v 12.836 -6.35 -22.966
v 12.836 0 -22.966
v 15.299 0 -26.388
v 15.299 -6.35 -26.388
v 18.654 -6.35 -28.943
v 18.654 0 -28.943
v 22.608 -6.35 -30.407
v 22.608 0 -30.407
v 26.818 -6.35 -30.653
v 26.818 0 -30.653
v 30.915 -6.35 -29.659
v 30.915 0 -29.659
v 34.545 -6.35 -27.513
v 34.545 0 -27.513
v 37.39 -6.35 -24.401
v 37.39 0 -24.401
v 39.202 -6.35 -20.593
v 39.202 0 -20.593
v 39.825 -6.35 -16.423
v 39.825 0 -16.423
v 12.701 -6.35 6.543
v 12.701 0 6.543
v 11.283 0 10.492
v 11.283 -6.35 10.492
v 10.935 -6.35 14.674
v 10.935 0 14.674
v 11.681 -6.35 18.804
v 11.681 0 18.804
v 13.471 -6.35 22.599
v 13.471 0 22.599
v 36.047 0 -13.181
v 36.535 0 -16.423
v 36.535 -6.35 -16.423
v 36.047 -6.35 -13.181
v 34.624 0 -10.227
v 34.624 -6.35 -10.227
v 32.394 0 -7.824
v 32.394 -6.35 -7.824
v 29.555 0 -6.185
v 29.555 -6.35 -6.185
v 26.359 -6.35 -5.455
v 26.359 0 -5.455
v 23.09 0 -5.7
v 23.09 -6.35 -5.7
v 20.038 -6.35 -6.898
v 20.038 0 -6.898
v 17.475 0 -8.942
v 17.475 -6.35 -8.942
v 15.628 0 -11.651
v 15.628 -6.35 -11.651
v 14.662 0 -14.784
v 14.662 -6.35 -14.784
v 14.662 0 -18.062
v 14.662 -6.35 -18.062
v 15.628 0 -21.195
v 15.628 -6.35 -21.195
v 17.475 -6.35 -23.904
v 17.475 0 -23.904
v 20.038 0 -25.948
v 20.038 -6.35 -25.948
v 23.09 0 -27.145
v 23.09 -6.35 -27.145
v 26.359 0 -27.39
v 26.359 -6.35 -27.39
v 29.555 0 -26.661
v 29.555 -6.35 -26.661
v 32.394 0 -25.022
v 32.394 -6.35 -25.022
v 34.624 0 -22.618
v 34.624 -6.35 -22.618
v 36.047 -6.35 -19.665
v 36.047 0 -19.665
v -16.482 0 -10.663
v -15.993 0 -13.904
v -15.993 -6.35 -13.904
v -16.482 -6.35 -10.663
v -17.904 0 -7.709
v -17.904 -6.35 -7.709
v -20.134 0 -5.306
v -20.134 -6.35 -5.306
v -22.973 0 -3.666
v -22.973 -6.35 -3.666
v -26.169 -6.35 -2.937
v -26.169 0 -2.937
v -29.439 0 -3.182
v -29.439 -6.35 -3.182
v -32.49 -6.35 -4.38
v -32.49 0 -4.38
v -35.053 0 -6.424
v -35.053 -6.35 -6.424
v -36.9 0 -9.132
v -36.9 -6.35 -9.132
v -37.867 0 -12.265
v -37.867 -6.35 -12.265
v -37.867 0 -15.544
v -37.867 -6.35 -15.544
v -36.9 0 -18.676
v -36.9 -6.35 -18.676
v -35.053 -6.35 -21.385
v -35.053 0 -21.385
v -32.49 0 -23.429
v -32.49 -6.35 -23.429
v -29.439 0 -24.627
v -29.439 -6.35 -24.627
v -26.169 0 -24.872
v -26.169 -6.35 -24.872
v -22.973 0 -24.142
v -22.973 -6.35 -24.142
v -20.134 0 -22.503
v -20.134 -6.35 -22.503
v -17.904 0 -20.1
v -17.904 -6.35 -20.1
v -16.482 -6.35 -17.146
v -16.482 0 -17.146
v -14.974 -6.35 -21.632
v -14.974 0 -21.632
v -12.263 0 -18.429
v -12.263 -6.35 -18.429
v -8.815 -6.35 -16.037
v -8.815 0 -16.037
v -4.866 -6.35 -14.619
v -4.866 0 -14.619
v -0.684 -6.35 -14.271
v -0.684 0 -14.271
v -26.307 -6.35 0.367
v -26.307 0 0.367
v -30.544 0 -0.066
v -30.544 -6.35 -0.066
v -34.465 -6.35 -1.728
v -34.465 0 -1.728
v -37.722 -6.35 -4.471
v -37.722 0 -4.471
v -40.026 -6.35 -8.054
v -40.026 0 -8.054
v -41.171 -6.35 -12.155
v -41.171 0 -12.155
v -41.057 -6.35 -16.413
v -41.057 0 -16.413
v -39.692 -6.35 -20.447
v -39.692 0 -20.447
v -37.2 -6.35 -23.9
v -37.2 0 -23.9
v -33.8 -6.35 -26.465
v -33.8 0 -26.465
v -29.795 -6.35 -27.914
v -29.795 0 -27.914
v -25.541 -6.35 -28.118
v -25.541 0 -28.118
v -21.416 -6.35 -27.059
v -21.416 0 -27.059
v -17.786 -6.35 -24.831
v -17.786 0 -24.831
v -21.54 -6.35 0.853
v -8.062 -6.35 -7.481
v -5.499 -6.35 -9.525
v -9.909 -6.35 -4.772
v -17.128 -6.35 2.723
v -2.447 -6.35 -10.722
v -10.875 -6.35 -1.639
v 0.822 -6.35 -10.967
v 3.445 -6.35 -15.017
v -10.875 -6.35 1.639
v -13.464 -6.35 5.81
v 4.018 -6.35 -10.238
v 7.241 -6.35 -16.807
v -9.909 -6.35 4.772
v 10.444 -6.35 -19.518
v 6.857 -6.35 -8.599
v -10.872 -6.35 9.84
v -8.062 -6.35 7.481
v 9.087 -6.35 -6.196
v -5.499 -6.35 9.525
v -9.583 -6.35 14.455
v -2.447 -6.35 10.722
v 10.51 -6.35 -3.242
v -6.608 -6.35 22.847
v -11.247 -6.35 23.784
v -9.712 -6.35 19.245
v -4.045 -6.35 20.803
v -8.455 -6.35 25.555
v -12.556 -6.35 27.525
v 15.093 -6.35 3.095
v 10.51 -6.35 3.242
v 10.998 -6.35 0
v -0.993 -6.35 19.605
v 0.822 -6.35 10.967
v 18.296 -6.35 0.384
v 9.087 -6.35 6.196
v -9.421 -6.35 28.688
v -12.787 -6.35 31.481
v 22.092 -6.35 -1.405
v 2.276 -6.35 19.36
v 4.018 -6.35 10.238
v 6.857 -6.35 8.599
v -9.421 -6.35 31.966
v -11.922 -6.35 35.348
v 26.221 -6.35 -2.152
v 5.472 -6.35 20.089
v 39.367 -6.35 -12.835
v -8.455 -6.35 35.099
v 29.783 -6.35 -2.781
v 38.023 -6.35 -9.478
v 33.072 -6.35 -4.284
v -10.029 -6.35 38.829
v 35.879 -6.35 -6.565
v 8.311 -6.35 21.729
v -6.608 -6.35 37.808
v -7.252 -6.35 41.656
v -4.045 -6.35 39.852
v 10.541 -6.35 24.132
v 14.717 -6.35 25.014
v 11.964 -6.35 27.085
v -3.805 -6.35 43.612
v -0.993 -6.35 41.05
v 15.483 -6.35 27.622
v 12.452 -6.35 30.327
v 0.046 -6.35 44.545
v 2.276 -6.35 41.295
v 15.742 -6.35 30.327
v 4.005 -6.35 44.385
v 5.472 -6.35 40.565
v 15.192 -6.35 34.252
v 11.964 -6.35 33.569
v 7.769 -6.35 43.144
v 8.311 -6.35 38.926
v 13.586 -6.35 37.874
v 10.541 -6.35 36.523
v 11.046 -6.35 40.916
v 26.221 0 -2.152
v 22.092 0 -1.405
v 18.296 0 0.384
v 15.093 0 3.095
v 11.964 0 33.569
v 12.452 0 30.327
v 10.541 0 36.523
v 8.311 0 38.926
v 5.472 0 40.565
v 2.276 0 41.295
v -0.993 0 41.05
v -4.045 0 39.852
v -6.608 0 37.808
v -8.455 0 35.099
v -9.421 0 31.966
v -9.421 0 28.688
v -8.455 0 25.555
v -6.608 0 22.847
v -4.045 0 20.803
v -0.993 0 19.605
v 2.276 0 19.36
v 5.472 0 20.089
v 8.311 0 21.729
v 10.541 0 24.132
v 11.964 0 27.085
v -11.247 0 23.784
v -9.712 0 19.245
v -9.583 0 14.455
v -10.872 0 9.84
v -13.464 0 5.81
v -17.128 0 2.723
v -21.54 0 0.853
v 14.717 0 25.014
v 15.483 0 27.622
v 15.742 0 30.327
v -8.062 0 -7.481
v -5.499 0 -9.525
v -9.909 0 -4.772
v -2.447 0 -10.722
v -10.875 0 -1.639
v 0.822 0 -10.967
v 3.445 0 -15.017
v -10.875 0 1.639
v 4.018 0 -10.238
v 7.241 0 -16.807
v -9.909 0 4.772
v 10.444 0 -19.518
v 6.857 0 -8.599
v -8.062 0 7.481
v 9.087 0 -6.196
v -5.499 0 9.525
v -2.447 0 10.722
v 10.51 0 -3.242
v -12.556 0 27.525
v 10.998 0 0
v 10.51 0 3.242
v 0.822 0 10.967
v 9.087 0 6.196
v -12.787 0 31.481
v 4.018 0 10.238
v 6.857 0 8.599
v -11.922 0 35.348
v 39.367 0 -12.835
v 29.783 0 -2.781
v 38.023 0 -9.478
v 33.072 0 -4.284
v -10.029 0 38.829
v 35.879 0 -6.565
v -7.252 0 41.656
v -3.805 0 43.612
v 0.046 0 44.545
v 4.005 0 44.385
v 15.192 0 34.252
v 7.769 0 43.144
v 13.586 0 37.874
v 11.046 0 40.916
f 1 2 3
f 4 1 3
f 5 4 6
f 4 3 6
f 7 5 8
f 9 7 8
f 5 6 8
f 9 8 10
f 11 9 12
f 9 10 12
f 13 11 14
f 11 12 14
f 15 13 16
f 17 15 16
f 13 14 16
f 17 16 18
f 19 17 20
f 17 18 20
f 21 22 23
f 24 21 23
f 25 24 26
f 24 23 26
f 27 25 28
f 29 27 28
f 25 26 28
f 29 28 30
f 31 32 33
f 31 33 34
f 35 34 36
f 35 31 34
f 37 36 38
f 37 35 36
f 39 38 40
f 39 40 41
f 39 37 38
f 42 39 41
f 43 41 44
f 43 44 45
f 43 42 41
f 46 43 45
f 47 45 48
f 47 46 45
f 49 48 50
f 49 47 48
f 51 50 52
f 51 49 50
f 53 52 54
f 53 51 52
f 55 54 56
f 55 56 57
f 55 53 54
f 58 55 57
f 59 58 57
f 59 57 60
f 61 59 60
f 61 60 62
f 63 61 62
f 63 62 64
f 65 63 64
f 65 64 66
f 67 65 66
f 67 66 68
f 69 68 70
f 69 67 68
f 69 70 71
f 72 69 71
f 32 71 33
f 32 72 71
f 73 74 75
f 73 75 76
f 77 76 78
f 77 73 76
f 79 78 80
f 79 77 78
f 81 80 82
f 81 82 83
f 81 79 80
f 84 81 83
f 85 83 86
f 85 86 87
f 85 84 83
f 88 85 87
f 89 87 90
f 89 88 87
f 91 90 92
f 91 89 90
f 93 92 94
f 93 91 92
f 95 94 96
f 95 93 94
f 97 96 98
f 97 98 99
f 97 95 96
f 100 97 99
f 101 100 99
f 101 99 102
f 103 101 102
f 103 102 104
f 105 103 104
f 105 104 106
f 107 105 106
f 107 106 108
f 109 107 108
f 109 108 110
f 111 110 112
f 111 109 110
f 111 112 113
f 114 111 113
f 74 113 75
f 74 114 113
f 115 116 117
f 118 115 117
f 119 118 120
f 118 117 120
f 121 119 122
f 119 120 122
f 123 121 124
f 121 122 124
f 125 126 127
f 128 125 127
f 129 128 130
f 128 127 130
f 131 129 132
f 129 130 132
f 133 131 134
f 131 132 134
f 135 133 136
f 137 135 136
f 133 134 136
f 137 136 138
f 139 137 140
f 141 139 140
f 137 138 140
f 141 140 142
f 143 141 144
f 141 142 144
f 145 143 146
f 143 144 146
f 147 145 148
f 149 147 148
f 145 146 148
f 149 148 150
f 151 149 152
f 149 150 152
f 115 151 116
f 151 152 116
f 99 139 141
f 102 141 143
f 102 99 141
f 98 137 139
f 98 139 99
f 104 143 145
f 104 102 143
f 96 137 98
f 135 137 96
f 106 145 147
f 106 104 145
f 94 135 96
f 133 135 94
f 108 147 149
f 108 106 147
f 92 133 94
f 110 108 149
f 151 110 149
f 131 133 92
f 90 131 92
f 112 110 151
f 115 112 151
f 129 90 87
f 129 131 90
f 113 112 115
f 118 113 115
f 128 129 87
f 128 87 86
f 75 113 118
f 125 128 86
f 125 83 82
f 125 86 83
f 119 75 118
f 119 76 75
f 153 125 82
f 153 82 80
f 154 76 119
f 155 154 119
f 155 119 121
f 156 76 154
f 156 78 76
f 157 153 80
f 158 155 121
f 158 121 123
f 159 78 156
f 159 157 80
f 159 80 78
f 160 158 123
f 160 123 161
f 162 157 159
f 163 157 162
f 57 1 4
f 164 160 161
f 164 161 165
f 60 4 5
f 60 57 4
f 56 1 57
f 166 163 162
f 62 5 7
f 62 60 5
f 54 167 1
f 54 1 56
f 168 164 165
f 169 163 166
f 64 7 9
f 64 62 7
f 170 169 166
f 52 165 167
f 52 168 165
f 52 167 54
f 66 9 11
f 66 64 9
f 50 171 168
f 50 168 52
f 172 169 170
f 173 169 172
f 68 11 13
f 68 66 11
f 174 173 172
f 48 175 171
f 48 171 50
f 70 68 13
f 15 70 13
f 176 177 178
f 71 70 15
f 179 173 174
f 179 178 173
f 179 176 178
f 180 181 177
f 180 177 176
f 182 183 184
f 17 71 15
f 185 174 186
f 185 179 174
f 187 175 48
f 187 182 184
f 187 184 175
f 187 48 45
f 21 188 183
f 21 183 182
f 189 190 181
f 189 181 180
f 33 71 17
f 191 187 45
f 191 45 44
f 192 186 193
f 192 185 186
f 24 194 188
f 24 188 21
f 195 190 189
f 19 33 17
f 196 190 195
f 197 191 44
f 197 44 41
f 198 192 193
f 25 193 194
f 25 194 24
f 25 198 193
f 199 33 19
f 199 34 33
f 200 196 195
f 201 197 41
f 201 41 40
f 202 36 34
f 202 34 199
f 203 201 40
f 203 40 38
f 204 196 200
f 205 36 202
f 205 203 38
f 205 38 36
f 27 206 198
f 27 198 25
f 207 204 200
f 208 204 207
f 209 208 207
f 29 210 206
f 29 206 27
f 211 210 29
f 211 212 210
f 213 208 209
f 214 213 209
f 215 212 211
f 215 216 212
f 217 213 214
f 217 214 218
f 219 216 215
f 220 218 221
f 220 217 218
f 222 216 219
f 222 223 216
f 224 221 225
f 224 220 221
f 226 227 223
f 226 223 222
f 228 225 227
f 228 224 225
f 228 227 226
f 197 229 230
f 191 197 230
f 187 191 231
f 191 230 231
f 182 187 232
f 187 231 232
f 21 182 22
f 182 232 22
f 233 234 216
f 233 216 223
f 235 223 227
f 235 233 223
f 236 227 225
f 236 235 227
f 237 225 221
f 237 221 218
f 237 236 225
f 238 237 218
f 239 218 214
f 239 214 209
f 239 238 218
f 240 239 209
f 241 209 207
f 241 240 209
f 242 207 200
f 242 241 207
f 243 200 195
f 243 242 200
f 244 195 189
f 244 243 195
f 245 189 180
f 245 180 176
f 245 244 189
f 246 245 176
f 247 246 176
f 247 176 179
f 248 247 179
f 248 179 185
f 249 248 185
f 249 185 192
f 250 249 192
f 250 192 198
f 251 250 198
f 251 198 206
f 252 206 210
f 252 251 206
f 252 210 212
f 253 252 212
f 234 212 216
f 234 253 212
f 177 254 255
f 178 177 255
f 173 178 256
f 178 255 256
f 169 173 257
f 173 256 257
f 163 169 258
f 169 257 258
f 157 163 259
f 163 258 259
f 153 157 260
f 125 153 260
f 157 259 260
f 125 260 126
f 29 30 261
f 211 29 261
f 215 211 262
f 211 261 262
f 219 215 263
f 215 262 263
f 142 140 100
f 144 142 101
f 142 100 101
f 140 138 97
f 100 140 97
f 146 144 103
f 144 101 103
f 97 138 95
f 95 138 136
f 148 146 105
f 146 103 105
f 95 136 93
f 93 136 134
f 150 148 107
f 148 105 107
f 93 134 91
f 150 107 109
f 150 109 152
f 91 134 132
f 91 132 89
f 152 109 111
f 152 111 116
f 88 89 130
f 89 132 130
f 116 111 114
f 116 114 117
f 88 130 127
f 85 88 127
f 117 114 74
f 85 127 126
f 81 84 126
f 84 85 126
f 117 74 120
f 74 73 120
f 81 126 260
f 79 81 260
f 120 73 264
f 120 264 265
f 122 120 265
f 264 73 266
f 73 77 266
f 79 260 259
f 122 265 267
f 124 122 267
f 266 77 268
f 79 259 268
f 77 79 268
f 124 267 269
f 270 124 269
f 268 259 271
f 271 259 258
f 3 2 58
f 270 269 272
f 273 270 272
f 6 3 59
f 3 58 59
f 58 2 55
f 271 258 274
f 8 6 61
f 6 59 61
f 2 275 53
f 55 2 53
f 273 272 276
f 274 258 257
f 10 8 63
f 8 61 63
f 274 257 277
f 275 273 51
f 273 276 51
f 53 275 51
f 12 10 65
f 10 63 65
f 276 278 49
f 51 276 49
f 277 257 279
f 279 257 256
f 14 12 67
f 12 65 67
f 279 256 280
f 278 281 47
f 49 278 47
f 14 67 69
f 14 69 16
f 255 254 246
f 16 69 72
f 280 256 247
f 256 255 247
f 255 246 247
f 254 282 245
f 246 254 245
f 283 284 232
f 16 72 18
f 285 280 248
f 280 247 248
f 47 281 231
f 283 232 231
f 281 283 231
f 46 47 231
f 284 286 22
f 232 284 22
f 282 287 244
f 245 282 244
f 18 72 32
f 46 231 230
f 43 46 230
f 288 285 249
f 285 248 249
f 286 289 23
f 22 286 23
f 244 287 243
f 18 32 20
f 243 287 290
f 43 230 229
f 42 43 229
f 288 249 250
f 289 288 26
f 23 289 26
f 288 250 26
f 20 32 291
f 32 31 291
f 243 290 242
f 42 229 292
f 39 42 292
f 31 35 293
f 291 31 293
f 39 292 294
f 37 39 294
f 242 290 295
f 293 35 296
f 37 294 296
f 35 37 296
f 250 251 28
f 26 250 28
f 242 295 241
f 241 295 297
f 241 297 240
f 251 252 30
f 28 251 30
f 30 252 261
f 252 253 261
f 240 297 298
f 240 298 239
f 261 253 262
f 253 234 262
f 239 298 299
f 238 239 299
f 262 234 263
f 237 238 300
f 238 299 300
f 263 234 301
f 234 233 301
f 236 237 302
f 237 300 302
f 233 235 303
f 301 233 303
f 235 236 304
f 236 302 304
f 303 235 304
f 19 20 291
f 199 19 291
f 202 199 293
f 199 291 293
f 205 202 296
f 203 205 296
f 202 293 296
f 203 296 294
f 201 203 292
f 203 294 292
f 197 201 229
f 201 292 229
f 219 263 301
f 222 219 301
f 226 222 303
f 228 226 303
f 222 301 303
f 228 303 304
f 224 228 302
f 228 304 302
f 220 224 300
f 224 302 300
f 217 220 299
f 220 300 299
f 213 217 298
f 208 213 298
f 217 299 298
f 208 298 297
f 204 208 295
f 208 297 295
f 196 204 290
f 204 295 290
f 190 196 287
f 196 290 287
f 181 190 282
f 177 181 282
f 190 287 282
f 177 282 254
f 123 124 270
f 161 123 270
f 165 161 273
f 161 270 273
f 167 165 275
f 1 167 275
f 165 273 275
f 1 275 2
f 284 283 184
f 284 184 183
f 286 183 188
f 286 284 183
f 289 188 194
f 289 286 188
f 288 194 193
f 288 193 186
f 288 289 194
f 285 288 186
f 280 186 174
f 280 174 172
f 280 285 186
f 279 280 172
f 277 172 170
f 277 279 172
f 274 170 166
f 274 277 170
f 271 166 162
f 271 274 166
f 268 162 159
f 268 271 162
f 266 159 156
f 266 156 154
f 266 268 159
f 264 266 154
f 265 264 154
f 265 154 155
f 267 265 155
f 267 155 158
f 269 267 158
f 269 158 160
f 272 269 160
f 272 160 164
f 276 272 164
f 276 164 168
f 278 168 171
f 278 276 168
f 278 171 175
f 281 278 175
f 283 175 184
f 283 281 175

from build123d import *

# Parameters (mm, degrees)
F0_R     = 10.9982
F1_DEPTH = 6.35


with BuildPart() as f1:
    # F0 (on Front) → F1 (new body)
    with BuildSketch(Plane.XZ):
        with BuildLine():
            ThreePointArc((12.7012721412, 6.542961275), (13.8852814514, 3.3662464655), (14.2875, 0))
            ThreePointArc((14.2875, 0), (9.8578957303, -10.3418831951), (-0.6842652522, -14.2711049788))
            ThreePointArc((-0.6842652522, -14.2711049788), (7.240663618, -16.8071465228), (12.8358325851, -22.965887347))
            ThreePointArc((12.8358325851, -22.965887347), (13.5200979128, -8.6947823719), (26.2213700252, -2.151821041))
            ThreePointArc((26.2213700252, -2.151821041), (18.2964411378, 0.3842204693), (12.7012721412, 6.542961275))
        make_face()
        with BuildLine():
            ThreePointArc((-14.9742166985, -21.6324620433), (-8.8154758203, -16.0372930271), (-0.6842652522, -14.2711049788))
            ThreePointArc((-0.6842652522, -14.2711049788), (-12.7012721174, -6.5429613211), (-12.0170067319, 7.7281437263))
            ThreePointArc((-12.0170067319, 7.7281437263), (-18.1757475859, 2.1329746676), (-26.3069581555, 0.366786576))
            ThreePointArc((-26.3069581555, 0.366786576), (-16.649340262, -4.0464226961), (-12.7037234832, -13.9043183991))
            ThreePointArc((-12.7037234832, -13.9043183991), (-13.283093766, -17.9317041401), (-14.9742166985, -21.6324620433))
        make_face()
        with BuildLine():
            ThreePointArc((-12.0170067319, 7.7281437263), (0.6842654078, 14.2711049713), (12.7012721412, 6.542961275))
            ThreePointArc((12.7012721412, 6.542961275), (10.9350840416, 14.6741718257), (13.4711255704, 22.5991007709))
            ThreePointArc((13.4711255704, 22.5991007709), (0.769853458, 16.0561394401), (-11.2471533267, 23.7842830843))
            ThreePointArc((-11.2471533267, 23.7842830843), (-9.4809652551, 15.6530726068), (-12.0170067319, 7.7281437263))
        make_face()
        with BuildLine():
            ThreePointArc((39.8246046975, -16.4229260161), (35.8789879186, -6.5650303131), (26.2213700252, -2.151821041))
            ThreePointArc((26.2213700252, -2.151821041), (13.5200979128, -8.6947823719), (12.8358325851, -22.965887347))
            ThreePointArc((12.8358325851, -22.965887347), (28.9033511936, -30.3082074601), (39.8246046975, -16.4229260161))
        make_face()
        with Locations((25.5371046975, -16.4229260161)):
            Circle(F0_R, mode=Mode.SUBTRACT)
        with BuildLine():
            ThreePointArc((-11.2471533267, 23.7842830843), (0.769853458, 16.0561394401), (13.4711255704, 22.5991007709))
            ThreePointArc((13.4711255704, 22.5991007709), (15.1622485029, 26.2998586742), (15.7416187857, 30.3272444152))
            ThreePointArc((15.7416187857, 30.3272444152), (-1.9121277104, 44.2125258591), (-11.2471533267, 23.7842830843))
        make_face()
        with Locations((1.4541187857, 30.3272444152)):
            Circle(F0_R, mode=Mode.SUBTRACT)
        with BuildLine():
            ThreePointArc((-0.6842652522, -14.2711049788), (9.8578957303, -10.3418831951), (14.2875, 0))
            ThreePointArc((14.2875, 0), (13.8852814514, 3.3662464655), (12.7012721412, 6.542961275))
            ThreePointArc((12.7012721412, 6.542961275), (0.6842654078, 14.2711049713), (-12.0170067319, 7.7281437263))
            ThreePointArc((-12.0170067319, 7.7281437263), (-12.7012721174, -6.5429613211), (-0.6842652522, -14.2711049788))
        make_face()
        Circle(F0_R, mode=Mode.SUBTRACT)
        with BuildLine():
            ThreePointArc((-26.3069581555, 0.366786576), (-39.6924955955, -20.44727973), (-14.9742166985, -21.6324620433))
            ThreePointArc((-14.9742166985, -21.6324620433), (-13.283093766, -17.9317041401), (-12.7037234832, -13.9043183991))
            ThreePointArc((-12.7037234832, -13.9043183991), (-16.649340262, -4.0464226961), (-26.3069581555, 0.366786576))
        make_face()
        with Locations((-26.9912234832, -13.9043183991)):
            Circle(F0_R, mode=Mode.SUBTRACT)
    extrude(amount=F1_DEPTH)


solid = f1.part
